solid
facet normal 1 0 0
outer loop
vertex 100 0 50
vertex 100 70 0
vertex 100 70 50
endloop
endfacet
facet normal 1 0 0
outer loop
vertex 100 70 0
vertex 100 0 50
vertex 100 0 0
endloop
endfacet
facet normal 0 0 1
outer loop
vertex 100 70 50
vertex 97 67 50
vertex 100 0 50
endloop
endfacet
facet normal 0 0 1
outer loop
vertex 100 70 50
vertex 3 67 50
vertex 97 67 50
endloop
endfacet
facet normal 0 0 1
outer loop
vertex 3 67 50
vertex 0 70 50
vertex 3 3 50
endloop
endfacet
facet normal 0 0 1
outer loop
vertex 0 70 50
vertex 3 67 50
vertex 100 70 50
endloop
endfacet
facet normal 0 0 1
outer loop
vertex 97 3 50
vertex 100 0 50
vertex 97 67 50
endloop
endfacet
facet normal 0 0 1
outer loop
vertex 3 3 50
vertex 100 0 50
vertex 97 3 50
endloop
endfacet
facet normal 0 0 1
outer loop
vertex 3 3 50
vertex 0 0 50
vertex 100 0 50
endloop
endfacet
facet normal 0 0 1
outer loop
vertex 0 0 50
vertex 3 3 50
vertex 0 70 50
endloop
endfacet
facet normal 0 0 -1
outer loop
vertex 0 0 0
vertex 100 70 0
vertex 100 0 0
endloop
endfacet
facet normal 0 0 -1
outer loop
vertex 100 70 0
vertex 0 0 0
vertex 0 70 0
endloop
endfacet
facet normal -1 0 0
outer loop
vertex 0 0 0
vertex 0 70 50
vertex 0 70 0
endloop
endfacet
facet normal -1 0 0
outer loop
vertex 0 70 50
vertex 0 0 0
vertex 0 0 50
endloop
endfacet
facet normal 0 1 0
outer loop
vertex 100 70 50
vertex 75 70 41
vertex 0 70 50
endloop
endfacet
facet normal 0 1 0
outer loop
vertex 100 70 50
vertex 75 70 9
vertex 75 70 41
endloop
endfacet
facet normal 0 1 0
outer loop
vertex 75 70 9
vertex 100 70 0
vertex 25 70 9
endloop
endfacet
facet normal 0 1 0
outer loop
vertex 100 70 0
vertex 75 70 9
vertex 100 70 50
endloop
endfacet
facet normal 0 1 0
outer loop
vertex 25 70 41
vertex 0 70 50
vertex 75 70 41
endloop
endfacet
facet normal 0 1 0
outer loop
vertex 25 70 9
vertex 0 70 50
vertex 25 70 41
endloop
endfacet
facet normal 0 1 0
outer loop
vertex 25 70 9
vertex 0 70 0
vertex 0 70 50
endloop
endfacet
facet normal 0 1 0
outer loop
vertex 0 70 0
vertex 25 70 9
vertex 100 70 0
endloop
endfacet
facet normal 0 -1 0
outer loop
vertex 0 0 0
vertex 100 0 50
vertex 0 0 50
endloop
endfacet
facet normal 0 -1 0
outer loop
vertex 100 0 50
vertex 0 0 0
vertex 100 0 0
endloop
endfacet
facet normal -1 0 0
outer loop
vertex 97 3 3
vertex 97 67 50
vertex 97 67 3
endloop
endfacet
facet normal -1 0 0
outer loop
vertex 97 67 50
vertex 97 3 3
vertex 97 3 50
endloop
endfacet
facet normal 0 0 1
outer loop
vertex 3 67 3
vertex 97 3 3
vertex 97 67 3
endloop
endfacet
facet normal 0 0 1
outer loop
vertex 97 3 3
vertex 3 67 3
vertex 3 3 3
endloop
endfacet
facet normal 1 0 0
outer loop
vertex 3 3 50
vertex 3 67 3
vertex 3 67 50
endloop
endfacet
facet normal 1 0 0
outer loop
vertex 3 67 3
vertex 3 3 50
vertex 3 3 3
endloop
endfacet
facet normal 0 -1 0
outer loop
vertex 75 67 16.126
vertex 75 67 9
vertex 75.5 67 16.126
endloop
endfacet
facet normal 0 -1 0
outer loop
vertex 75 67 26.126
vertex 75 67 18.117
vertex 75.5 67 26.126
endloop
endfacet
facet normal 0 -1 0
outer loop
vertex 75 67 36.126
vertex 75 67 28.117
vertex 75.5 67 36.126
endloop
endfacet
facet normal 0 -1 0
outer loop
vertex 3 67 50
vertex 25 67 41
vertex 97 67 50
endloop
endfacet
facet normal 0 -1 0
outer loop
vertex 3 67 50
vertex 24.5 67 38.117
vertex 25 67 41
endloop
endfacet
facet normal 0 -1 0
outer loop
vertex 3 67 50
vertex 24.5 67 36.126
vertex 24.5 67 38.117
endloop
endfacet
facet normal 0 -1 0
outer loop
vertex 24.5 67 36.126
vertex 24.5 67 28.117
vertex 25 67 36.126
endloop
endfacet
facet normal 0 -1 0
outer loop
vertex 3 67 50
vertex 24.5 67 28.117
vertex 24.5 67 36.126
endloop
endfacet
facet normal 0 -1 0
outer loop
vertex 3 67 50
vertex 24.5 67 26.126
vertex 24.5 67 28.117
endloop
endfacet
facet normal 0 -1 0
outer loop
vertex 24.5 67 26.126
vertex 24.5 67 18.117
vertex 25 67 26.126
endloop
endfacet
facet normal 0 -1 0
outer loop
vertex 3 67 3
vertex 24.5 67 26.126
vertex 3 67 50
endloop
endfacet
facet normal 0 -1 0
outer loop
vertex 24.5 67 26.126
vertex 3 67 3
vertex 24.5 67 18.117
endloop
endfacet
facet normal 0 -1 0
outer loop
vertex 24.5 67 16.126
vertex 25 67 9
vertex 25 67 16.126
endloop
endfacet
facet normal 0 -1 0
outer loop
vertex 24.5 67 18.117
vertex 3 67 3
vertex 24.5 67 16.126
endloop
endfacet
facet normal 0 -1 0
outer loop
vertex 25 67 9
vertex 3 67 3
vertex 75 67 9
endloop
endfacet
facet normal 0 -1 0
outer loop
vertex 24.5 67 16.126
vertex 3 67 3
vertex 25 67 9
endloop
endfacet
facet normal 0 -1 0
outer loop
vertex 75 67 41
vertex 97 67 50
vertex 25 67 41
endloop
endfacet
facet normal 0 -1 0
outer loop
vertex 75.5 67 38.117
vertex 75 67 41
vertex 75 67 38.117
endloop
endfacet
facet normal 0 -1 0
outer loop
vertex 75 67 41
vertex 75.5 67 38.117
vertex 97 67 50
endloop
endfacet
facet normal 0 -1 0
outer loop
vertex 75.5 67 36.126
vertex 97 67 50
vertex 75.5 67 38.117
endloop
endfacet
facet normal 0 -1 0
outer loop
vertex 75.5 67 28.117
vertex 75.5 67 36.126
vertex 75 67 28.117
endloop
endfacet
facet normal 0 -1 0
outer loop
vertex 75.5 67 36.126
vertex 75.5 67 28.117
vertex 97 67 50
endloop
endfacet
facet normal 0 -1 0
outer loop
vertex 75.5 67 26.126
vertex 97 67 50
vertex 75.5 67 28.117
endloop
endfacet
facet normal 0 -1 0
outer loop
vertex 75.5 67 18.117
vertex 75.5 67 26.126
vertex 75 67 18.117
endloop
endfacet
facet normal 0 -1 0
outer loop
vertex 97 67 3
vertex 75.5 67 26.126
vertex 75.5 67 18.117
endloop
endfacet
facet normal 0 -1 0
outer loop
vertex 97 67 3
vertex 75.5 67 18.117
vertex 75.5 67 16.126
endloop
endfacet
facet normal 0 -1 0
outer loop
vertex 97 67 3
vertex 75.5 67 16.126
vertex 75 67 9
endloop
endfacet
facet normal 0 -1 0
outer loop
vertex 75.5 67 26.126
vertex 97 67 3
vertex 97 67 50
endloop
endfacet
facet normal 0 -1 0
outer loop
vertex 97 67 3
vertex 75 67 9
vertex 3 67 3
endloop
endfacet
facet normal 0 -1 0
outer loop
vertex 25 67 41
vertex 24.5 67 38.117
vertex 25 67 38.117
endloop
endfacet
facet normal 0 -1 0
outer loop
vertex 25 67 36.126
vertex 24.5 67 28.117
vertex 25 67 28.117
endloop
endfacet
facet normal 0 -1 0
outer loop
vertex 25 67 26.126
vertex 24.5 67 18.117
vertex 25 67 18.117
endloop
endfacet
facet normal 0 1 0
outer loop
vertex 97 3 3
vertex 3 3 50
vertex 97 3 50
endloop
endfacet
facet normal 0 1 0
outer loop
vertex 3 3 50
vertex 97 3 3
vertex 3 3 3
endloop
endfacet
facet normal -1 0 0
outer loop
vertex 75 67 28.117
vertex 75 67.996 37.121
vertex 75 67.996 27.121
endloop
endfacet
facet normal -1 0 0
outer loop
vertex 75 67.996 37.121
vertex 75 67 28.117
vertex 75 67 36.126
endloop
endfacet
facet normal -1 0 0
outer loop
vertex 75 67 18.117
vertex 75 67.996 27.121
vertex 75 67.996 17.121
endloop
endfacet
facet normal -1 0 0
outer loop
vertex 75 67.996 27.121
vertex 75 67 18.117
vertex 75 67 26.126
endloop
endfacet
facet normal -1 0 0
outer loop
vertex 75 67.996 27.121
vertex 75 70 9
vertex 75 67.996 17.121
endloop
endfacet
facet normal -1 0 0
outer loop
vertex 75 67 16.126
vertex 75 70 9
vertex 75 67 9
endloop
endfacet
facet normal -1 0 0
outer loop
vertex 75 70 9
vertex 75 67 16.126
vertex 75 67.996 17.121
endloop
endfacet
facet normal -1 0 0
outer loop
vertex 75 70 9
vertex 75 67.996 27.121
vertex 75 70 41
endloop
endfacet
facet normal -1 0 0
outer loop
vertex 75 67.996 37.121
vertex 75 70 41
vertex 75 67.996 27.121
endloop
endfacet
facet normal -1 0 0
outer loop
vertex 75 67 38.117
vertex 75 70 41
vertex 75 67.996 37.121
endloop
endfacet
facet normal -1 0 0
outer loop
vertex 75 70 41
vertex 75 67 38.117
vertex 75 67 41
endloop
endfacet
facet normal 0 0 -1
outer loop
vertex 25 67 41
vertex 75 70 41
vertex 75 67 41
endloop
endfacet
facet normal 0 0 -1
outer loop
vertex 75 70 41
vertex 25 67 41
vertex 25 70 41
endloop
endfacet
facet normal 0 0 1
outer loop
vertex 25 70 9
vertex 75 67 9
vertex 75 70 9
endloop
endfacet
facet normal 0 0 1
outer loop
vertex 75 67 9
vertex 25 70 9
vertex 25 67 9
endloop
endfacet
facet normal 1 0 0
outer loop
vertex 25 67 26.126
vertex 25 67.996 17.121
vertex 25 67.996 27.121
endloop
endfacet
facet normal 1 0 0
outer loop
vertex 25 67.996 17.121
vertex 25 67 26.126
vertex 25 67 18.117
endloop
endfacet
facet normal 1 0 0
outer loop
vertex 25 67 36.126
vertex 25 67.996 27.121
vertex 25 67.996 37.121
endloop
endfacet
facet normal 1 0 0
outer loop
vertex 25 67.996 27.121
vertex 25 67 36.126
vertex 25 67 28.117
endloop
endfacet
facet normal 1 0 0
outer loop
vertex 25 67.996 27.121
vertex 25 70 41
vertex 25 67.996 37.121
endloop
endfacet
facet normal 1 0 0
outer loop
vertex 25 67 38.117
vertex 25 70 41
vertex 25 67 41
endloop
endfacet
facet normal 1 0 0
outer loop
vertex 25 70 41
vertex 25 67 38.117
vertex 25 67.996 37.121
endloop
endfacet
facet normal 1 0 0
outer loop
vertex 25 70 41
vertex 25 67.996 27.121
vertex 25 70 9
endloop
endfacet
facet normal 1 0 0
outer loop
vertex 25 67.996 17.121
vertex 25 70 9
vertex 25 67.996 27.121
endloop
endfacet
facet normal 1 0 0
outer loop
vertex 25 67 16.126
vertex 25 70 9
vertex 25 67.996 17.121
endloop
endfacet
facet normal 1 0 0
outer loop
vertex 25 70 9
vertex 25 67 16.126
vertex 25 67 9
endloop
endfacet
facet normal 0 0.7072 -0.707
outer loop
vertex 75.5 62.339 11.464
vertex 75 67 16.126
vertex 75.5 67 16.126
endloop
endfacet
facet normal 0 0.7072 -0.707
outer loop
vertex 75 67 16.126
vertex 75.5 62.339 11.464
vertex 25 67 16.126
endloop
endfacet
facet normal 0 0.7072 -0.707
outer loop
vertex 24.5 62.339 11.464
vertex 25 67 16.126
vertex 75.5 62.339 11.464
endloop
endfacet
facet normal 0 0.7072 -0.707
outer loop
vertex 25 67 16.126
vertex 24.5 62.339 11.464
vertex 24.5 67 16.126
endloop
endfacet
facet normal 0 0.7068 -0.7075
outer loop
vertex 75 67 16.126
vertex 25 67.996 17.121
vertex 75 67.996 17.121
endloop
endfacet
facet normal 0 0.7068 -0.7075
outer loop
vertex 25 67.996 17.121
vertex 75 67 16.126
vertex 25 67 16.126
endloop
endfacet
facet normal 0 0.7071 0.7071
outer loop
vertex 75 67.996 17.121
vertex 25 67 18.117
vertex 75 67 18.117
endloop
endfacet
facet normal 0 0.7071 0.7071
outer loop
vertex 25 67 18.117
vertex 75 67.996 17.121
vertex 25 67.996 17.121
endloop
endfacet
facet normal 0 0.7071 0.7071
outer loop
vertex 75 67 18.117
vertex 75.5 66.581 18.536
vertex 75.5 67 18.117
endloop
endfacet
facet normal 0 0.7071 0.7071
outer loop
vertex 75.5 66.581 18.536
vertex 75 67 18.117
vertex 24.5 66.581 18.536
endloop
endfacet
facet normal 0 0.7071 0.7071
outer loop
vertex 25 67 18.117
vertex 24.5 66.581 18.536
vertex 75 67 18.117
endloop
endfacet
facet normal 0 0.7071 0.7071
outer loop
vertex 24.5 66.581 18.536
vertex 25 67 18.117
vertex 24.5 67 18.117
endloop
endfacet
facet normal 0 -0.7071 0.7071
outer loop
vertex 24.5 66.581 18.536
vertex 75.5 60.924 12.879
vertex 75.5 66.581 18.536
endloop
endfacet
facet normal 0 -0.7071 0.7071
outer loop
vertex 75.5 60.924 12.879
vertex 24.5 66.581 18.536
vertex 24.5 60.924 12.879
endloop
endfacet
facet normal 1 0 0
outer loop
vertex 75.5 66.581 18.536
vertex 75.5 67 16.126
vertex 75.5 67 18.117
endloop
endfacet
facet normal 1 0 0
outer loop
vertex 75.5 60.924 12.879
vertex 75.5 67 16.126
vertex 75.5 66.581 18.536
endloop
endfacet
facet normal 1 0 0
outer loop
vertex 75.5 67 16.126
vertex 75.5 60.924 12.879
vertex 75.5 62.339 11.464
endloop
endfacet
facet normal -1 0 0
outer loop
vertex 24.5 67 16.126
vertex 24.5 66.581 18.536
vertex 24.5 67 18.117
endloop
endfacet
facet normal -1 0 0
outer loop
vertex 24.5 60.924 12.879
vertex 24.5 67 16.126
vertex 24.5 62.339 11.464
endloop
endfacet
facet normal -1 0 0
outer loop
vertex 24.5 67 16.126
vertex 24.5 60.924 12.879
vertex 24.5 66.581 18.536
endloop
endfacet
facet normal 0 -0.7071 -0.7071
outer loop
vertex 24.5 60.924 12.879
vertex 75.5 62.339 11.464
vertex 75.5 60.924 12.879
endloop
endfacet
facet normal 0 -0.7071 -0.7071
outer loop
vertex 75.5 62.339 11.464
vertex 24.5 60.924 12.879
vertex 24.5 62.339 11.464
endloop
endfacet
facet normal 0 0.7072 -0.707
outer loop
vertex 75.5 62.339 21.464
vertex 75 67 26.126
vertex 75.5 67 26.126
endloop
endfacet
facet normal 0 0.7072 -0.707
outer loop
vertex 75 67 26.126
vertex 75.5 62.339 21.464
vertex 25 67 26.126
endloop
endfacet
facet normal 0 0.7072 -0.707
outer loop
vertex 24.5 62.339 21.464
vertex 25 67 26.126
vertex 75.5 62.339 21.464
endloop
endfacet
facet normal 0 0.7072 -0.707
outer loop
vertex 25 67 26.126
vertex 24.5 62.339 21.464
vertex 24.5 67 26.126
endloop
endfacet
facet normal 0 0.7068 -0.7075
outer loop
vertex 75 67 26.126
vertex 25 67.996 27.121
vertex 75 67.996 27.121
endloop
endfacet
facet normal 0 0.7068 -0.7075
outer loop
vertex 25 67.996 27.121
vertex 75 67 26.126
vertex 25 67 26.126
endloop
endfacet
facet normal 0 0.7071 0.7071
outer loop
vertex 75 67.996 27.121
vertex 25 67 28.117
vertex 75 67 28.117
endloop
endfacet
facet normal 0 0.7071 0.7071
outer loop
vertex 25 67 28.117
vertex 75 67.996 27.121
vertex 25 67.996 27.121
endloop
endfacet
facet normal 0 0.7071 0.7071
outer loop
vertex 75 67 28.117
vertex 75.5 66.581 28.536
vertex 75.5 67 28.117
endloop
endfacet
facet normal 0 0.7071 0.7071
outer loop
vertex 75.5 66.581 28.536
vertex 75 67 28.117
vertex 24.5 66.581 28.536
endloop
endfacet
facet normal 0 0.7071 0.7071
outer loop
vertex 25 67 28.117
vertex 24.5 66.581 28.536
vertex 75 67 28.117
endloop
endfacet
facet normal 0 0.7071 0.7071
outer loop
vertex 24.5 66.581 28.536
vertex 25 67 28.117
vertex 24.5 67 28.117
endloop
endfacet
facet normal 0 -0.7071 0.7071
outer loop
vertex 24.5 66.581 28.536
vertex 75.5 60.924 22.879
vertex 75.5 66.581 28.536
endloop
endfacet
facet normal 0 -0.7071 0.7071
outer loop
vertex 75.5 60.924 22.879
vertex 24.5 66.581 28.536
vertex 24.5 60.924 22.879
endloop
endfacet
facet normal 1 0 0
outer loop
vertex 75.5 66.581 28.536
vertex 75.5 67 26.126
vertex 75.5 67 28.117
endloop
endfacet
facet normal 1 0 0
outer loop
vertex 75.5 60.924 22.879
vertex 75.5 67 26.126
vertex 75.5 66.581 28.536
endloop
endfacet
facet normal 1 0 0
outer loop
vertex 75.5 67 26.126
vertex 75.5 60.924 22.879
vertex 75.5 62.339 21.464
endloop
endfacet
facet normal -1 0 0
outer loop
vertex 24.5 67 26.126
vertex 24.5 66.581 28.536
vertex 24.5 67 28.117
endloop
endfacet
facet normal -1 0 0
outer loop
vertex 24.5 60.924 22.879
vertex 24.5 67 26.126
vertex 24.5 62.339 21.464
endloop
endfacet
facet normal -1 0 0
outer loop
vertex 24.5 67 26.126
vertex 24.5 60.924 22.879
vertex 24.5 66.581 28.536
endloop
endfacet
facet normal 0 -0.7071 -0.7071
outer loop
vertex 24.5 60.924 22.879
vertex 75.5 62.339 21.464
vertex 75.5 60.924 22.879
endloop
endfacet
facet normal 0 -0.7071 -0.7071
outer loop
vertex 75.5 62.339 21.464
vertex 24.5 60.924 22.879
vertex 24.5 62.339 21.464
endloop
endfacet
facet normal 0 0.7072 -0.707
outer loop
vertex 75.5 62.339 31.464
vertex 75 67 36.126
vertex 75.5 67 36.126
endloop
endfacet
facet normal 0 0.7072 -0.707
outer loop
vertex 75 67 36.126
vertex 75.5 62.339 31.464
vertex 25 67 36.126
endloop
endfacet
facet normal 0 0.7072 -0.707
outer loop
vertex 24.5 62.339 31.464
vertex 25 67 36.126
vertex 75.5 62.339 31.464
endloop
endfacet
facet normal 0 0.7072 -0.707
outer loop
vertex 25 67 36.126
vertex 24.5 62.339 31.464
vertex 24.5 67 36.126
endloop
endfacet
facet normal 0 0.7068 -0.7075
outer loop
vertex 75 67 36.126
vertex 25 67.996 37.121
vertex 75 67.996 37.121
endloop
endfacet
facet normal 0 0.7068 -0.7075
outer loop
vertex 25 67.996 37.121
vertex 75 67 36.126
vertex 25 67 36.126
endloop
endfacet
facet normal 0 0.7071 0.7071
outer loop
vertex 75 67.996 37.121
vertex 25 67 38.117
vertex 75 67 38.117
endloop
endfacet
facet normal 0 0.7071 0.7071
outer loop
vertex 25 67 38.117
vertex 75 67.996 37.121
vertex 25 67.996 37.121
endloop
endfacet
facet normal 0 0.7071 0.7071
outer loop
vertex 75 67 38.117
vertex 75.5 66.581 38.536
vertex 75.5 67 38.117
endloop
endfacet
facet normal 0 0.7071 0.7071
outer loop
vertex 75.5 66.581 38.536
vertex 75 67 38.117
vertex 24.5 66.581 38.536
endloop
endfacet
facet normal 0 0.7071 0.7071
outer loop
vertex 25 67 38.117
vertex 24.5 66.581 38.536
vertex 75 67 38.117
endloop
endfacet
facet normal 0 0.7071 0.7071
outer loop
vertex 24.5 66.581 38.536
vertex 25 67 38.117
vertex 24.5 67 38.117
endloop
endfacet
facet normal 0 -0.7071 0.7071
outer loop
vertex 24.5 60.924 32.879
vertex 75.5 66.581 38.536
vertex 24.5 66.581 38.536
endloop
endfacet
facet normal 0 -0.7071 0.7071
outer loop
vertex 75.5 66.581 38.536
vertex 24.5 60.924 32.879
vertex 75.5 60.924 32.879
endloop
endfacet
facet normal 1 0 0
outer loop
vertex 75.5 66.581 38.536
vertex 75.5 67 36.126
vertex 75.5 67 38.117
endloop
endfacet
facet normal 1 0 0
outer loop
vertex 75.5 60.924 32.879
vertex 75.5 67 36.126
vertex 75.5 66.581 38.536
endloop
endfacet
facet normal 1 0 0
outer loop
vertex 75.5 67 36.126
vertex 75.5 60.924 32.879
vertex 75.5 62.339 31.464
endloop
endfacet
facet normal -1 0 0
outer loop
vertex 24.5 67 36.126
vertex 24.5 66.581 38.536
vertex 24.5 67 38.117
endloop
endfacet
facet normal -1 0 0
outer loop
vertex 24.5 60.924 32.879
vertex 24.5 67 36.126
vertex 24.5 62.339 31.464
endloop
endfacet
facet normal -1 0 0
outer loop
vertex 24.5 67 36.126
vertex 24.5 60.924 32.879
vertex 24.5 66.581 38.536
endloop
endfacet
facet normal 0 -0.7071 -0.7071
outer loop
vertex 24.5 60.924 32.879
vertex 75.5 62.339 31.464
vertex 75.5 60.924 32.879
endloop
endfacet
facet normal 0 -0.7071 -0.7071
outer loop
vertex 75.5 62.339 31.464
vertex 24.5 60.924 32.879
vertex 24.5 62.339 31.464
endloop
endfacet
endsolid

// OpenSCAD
$fn = 32;

// ----------------------------------------------------------------------
// Vent box: louvers enclosure
// ----------------------------------------------------------------------

// --- parameters (mm) ---
box_l = 100;              // box length, X
box_w = 70;               // box width, Y
box_h = 50;               // box height, Z
wall_t = 3;               // shell wall thickness
win_l = 50;               // vent window width, X
win_h = 32;               // vent window height, Z
slat_t = 2;               // louver slat thickness
slat_d = 8;               // louver slat depth
slat_a = 45;              // louver slat angle, degrees
slat_pitch = 10;          // louver pitch
slat_yc = 64.46;          // slat centreline Y
fit_tol = 0.02;           // tolerance for press fits, mm
free_tol = 0.2;           // tolerance for clearance fits, mm

win_z0 = (box_h - win_h) / 2;  // window lower edge Z
n_slats = 3;  // louver count
slat_z0 = win_z0 + (win_h - (n_slats - 1) * slat_pitch) / 2;

difference() {
  union() {
    difference() {
      cube([box_l, box_w, box_h]);
  translate([wall_t, wall_t, wall_t])
    cube([box_l - 2 * wall_t, box_w - 2 * wall_t, box_h]);
  translate([(box_l - win_l) / 2, box_w - wall_t - 1, win_z0])
    cube([win_l, wall_t + 2, win_h]);
    }
    for (i = [0 : n_slats - 1])
      translate([box_l / 2, slat_yc, slat_z0 + i * slat_pitch])
        rotate([slat_a, 0, 0])
          cube([win_l + 1, slat_d, slat_t], center = true);
  }
}
